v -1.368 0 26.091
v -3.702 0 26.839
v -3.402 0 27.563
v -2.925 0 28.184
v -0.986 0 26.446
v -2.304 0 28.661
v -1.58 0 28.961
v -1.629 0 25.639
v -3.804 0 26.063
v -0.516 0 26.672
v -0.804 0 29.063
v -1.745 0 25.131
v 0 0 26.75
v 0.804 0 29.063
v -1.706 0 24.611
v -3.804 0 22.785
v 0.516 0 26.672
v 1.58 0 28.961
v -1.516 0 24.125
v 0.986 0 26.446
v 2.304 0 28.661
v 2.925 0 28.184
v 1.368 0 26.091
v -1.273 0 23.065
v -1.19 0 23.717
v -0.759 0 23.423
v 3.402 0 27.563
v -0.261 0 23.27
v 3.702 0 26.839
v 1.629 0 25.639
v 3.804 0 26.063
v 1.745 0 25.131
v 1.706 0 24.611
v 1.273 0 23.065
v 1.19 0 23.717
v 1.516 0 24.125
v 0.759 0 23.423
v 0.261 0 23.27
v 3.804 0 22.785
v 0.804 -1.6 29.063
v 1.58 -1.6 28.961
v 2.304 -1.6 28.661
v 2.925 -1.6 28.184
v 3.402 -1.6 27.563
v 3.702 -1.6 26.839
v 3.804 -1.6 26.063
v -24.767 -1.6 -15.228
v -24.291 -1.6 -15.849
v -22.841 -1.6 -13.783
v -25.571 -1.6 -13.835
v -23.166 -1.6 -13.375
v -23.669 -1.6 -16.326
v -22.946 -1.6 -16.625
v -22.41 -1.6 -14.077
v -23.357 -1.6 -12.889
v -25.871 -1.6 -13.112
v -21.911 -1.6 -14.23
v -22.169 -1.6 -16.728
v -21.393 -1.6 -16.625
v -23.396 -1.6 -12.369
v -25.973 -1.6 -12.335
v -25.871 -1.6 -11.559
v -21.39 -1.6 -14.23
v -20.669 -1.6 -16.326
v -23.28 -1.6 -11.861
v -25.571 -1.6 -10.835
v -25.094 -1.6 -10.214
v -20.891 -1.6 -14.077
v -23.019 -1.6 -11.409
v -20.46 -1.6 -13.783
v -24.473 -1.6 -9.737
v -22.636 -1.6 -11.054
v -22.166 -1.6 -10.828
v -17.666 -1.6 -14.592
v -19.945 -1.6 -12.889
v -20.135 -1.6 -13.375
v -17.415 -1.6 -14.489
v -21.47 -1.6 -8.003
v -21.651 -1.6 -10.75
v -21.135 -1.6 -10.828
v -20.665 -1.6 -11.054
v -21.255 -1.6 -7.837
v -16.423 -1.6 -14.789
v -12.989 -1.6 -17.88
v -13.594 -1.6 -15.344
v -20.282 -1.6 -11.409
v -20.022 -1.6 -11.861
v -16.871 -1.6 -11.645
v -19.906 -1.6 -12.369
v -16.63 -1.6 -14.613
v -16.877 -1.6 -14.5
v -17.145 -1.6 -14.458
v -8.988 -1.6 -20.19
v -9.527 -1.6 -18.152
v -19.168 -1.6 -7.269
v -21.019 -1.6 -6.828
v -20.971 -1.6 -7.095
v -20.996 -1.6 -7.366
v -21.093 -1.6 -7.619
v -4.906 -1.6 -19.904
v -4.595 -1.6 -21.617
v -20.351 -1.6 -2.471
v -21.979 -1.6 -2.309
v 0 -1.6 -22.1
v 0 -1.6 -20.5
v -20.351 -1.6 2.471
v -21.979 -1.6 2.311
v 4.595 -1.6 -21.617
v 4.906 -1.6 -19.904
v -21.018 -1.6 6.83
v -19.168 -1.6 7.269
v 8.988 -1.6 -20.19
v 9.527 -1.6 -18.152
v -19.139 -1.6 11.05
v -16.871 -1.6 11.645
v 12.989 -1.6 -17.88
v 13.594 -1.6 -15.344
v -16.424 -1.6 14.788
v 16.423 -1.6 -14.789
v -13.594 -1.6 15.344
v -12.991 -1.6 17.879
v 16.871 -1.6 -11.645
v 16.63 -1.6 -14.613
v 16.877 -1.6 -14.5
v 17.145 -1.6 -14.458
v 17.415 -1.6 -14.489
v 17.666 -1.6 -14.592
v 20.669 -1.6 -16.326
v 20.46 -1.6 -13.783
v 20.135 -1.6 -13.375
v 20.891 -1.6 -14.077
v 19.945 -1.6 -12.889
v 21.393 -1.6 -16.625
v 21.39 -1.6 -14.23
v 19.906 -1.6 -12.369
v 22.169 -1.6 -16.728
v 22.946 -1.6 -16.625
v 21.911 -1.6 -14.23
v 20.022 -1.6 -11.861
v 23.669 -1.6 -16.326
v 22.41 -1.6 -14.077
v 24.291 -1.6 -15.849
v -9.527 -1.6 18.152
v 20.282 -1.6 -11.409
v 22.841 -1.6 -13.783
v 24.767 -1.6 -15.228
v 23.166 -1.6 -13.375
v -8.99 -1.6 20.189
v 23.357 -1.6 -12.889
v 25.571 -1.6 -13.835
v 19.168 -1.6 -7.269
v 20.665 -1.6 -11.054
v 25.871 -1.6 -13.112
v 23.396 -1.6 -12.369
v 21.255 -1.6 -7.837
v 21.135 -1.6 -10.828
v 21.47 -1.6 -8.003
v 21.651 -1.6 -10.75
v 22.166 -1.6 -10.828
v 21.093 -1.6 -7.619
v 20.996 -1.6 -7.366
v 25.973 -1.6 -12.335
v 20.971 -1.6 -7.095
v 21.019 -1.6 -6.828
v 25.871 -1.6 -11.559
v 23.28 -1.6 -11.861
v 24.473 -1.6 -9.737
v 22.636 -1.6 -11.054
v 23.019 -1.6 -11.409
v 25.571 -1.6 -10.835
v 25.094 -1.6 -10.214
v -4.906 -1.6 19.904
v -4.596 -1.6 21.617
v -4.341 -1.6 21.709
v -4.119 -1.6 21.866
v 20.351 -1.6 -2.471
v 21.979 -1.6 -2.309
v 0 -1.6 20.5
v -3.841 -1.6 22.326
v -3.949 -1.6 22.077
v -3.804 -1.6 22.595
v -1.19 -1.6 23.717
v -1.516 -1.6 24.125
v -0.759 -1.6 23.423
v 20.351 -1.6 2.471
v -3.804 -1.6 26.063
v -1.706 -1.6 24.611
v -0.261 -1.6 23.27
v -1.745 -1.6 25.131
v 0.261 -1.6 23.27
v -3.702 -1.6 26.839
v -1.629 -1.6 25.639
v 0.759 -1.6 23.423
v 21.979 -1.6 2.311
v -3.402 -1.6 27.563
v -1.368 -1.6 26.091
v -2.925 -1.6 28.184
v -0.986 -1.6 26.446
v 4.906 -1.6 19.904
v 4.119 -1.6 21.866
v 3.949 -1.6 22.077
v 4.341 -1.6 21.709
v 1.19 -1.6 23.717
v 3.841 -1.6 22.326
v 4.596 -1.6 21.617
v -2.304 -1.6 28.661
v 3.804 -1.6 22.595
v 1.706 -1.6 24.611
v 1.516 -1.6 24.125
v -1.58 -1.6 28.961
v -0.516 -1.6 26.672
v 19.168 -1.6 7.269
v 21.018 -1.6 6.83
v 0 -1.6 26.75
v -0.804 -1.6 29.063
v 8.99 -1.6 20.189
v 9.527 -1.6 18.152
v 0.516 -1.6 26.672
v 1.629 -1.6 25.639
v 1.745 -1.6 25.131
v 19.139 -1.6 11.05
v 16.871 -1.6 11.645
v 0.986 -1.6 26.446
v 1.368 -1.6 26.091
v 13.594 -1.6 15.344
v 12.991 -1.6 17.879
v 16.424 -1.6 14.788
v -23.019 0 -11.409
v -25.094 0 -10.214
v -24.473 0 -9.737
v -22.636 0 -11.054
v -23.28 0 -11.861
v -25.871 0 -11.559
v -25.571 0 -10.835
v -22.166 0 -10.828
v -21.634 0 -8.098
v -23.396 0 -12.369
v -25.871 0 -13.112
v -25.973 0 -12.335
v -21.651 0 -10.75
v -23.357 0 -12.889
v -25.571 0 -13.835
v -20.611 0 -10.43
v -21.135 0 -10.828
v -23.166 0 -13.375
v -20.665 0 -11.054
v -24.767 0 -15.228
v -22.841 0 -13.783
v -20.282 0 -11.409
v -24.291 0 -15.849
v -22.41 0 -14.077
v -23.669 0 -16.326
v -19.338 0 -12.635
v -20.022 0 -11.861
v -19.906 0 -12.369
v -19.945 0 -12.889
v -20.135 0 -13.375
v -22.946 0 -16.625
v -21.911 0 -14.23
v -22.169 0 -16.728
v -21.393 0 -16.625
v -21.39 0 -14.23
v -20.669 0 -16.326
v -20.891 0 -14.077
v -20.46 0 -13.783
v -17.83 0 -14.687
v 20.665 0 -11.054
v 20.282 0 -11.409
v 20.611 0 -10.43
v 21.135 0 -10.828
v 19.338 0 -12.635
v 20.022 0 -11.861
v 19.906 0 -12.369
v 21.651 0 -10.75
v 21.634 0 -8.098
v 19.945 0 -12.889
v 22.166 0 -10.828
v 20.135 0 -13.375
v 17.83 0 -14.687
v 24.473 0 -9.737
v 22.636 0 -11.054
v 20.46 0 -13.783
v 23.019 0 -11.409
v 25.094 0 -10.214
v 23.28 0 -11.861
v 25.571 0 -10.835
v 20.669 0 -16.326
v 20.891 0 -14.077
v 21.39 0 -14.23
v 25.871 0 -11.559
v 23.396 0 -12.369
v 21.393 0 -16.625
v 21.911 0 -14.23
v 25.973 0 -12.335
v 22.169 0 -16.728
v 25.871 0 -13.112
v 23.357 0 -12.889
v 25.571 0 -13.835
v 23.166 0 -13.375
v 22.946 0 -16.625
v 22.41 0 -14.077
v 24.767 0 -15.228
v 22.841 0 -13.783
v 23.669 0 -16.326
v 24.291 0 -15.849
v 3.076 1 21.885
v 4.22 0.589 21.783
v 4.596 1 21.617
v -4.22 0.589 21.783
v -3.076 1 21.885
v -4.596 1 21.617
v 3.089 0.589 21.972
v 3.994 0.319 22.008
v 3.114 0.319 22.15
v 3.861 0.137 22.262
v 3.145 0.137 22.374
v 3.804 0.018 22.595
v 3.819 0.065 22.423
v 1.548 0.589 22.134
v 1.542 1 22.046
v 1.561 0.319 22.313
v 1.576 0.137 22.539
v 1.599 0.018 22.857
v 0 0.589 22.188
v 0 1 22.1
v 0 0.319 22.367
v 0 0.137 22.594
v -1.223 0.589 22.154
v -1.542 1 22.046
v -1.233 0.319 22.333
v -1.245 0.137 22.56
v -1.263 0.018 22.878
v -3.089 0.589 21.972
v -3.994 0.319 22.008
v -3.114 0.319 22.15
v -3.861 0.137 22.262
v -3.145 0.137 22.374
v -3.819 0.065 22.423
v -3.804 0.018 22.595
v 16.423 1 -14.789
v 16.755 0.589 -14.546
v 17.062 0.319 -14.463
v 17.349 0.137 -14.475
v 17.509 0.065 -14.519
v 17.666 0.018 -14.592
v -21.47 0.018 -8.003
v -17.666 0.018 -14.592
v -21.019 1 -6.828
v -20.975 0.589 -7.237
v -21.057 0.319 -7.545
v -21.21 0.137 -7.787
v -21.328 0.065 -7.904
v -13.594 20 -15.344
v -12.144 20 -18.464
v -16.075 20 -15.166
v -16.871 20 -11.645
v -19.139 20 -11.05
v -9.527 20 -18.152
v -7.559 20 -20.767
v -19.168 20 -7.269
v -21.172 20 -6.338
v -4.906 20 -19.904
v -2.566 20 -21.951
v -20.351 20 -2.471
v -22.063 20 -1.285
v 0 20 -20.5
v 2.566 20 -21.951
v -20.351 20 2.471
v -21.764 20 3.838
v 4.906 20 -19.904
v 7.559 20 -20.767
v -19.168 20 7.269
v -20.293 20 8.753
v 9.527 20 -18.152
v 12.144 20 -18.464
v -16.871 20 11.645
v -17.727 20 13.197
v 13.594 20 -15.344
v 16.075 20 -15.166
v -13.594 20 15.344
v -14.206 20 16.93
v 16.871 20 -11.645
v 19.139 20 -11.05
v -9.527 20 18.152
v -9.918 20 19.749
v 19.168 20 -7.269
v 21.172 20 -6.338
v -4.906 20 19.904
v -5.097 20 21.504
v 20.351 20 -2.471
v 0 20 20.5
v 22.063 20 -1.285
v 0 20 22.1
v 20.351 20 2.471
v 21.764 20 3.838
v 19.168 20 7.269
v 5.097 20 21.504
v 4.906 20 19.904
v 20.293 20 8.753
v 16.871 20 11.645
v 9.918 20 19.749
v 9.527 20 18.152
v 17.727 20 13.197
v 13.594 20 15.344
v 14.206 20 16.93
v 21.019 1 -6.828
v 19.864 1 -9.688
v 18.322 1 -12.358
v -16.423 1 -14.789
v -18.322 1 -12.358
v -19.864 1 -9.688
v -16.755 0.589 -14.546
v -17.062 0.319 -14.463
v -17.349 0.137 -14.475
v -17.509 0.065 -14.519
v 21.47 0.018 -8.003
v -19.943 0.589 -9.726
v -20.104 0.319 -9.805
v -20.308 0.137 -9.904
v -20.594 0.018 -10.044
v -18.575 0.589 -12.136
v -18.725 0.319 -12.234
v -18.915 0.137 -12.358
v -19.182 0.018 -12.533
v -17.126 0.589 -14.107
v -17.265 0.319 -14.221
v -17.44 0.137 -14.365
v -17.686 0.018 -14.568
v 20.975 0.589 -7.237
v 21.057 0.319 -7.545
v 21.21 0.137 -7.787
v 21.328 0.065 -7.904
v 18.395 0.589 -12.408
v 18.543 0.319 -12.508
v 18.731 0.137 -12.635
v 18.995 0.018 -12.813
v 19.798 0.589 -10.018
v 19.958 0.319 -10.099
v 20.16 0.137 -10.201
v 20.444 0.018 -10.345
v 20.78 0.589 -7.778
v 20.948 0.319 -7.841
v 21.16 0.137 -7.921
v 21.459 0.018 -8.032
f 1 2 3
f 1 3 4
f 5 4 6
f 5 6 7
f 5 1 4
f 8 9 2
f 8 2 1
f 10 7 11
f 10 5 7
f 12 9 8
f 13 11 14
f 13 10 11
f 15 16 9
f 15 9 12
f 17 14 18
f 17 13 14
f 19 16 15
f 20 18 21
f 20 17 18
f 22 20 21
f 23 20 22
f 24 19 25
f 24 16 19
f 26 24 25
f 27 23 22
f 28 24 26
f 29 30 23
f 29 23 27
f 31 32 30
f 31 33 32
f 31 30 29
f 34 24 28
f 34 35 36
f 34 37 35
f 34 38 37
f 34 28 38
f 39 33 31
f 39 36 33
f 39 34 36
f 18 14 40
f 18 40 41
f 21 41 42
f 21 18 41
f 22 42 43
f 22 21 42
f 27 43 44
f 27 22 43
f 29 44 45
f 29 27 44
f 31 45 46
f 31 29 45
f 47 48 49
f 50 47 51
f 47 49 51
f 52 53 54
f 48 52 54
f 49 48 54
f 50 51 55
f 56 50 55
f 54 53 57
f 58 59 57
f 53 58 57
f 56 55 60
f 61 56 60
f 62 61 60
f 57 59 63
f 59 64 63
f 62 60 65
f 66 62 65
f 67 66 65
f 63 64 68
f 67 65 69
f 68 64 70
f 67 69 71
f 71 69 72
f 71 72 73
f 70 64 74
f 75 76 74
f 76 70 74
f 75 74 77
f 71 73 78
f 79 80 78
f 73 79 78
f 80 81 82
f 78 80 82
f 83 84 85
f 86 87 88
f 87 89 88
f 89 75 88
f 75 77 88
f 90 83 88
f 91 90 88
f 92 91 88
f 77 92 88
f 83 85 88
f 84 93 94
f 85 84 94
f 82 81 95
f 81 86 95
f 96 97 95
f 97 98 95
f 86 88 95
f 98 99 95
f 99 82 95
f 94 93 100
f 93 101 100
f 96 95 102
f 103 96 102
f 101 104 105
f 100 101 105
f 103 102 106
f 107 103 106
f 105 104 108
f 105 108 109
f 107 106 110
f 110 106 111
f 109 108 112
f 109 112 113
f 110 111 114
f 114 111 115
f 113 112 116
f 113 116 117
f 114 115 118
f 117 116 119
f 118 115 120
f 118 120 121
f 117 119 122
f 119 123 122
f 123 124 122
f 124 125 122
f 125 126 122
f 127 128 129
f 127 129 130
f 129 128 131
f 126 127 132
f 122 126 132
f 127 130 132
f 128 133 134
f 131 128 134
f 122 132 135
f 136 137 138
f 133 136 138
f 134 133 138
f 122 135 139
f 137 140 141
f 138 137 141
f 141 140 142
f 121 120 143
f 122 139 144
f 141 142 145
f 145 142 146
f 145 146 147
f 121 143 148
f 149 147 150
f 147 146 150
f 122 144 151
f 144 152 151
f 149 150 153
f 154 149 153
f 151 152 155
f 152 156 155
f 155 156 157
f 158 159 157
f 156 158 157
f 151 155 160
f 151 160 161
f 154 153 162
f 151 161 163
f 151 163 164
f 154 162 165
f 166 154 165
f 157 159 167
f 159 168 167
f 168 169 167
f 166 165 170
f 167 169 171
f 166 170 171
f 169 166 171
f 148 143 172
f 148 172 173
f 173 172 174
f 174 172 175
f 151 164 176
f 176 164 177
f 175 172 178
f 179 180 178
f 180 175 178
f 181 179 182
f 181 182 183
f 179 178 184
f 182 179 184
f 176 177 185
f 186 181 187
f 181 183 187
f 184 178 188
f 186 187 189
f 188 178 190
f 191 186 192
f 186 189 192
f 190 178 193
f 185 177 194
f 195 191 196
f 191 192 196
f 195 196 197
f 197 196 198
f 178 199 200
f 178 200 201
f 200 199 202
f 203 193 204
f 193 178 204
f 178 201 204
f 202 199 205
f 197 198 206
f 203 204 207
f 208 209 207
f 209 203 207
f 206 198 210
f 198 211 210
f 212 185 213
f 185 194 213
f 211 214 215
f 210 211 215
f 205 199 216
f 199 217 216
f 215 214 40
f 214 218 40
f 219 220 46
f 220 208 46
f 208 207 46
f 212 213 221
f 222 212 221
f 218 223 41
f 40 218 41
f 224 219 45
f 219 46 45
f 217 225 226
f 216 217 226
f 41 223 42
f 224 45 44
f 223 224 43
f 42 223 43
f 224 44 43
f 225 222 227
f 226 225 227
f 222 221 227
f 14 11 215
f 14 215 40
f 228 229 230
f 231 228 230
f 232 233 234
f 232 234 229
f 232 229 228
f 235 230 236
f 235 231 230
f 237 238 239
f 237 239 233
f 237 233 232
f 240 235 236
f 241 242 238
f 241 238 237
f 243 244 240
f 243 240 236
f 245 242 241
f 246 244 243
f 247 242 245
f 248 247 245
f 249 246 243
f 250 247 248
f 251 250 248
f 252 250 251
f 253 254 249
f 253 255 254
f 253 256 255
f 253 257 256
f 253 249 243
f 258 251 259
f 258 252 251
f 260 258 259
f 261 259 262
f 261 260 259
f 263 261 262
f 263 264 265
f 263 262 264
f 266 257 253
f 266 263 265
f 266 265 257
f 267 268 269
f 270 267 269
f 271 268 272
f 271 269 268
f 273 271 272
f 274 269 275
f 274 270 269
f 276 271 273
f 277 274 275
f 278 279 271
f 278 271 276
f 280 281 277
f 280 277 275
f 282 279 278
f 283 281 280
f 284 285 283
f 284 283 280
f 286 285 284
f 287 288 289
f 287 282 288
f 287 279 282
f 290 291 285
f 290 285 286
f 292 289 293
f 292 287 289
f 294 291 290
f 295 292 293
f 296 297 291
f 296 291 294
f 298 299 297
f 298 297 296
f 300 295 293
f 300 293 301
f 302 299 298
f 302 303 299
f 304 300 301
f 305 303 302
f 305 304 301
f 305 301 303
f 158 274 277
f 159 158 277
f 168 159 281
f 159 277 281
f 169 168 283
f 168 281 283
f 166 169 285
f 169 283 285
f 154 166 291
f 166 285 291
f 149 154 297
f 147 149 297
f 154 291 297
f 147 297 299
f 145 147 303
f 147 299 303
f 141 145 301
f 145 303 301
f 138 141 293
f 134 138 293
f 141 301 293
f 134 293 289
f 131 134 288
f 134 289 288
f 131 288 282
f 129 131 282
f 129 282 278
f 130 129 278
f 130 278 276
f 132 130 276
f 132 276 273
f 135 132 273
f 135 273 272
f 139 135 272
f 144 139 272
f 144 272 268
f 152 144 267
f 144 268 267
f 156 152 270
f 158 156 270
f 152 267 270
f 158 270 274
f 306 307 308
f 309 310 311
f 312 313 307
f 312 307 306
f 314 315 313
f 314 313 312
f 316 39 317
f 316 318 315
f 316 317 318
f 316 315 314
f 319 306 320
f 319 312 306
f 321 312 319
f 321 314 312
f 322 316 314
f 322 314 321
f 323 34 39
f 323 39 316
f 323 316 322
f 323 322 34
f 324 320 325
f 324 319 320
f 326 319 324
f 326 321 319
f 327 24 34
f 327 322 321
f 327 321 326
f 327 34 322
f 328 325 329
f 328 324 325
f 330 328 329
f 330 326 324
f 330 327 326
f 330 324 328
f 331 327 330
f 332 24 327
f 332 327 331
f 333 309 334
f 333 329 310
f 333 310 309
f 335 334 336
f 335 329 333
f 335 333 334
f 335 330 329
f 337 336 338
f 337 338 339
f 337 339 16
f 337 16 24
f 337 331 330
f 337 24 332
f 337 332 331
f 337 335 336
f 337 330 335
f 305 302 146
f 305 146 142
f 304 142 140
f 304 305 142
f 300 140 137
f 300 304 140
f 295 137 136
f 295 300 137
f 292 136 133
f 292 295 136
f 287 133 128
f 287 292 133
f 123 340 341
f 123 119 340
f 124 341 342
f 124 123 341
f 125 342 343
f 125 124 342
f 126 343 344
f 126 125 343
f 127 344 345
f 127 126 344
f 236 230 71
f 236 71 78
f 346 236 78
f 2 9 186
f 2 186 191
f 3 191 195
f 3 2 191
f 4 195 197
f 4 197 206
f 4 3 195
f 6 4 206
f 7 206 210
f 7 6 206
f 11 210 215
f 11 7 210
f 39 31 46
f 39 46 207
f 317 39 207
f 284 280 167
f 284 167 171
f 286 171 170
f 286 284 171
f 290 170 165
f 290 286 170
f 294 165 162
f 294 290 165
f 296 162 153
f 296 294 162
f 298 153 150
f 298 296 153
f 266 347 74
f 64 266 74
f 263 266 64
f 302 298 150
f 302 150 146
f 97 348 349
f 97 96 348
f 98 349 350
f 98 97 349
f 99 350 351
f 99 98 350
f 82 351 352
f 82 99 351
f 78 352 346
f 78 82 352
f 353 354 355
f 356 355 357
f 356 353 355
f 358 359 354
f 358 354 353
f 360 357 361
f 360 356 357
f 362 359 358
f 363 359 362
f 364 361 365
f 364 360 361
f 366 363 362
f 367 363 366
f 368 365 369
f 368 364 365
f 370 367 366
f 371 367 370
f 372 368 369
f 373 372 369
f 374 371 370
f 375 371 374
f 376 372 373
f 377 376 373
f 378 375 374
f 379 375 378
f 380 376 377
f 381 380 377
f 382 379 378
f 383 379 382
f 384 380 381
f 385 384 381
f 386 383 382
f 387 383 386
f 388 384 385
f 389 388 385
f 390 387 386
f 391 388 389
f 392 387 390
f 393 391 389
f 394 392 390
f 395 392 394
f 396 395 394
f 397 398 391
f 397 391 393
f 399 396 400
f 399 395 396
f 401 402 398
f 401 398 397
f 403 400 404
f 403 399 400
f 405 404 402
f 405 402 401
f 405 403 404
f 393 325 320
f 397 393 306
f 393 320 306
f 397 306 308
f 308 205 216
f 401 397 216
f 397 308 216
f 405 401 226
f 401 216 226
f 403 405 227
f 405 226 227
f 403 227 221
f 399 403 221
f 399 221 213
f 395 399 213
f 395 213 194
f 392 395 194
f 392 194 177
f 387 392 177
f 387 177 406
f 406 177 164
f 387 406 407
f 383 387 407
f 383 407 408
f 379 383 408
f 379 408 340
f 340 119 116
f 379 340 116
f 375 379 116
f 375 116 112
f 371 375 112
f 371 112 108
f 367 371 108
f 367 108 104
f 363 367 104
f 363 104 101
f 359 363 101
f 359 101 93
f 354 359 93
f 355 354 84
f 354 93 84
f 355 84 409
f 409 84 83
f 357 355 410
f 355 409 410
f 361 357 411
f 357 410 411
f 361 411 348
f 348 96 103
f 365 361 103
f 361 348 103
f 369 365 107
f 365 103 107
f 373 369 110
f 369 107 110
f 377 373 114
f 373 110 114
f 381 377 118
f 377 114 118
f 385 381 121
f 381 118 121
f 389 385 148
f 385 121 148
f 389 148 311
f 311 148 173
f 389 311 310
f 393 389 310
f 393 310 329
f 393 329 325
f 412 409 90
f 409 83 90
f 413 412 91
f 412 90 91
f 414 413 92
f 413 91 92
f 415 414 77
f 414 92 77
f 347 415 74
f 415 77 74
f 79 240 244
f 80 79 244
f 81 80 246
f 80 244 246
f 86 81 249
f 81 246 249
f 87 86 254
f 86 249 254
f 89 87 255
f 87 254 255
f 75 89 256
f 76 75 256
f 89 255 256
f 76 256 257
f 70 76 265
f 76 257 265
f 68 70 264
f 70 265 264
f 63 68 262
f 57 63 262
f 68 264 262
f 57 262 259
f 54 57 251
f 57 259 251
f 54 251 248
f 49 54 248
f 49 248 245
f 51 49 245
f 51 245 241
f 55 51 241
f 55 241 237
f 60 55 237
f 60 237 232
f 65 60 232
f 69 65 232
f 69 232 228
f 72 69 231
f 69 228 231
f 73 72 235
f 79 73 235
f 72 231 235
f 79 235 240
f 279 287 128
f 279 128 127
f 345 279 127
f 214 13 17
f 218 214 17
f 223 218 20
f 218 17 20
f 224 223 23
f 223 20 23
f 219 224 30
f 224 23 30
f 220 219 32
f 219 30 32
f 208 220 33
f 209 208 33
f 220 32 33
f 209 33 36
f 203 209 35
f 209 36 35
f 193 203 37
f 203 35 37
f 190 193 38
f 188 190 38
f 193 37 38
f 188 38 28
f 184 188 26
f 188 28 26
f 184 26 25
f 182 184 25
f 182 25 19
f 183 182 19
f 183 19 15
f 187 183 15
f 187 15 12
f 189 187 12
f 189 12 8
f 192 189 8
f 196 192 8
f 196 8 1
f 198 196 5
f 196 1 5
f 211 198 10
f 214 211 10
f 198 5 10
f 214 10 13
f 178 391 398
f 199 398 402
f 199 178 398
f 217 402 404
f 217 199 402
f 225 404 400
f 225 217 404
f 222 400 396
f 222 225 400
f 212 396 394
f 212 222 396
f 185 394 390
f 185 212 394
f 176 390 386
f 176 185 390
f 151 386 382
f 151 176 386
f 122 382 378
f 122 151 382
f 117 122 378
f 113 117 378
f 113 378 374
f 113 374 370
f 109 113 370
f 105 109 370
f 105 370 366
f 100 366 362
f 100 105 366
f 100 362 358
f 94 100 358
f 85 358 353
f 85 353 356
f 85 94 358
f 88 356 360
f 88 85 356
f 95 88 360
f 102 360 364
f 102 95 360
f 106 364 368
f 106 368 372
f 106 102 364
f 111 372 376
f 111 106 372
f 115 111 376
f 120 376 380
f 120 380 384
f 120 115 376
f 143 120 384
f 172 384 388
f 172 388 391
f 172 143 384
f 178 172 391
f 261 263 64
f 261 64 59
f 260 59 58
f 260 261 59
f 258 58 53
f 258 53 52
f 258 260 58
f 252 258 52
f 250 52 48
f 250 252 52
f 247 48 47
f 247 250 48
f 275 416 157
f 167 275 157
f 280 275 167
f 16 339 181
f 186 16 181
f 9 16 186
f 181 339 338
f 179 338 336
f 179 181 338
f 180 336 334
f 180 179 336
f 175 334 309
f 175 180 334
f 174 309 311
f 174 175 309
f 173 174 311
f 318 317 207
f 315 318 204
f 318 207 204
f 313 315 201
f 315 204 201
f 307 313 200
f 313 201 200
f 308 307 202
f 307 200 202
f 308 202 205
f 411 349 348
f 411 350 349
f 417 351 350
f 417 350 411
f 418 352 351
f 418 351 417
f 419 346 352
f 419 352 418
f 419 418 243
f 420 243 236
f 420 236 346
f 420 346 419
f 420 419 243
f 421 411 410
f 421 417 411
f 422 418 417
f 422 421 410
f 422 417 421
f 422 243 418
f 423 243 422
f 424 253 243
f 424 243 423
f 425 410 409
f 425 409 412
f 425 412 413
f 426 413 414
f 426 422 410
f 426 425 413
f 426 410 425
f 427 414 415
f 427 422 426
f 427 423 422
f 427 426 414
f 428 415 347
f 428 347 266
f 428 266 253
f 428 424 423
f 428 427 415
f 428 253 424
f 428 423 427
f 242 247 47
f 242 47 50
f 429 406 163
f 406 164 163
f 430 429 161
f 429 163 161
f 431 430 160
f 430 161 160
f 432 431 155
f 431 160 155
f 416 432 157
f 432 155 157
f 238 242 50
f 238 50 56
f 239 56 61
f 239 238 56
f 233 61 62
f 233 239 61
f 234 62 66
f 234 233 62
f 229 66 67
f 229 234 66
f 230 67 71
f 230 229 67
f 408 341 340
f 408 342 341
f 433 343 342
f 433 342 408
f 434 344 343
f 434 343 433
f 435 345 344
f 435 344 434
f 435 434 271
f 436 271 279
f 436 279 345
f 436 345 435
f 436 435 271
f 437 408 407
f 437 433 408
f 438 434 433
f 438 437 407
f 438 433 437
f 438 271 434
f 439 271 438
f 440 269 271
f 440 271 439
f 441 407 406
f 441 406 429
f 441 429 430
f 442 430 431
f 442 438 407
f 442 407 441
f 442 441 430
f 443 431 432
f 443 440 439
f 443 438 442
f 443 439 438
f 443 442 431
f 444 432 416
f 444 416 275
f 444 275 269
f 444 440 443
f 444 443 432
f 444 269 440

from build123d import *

# Parameters (mm, degrees)
SKETCH1_R           = 20.5
BOSS_EXTRUDE2_DEPTH = 20
SHELL1_T            = 1.6
CUT_EXTRUDE1_START  = -10
SKETCH7_R           = 20.5
CUT_EXTRUDE1_DEPTH  = 10
SKETCH8_R           = 1.75
BOSS_EXTRUDE3_DEPTH = 1.6
FILLET1_R           = 1


with BuildPart() as part:
    # Sketch1 → Boss-Extrude2 (new body)
    with BuildSketch(Plane(origin=(0, 0, 0), x_dir=(1, 0, 0), z_dir=(0, 1, 0))):
        with Locations(Location((0, 0, 0), (0, 0, 270))):
            Circle(SKETCH1_R)
    extrude(amount=BOSS_EXTRUDE2_DEPTH)

    # Shell1
    shell1_openings = [part.faces().sort_by_distance(p)[0] for p in [
        (0, 20, 0),
    ]]
    offset(amount=SHELL1_T, openings=shell1_openings, kind=Kind.INTERSECTION)

    # Sketch7 → Cut-Extrude1 (cut)
    with BuildSketch(Plane(origin=(0, 0, 0), x_dir=(1, 0, 0), z_dir=(0, 1, 0)).offset(CUT_EXTRUDE1_START)):
        with Locations(Location((0, 0, 0), (0, 0, 270))):
            Circle(SKETCH7_R)
    extrude(amount=CUT_EXTRUDE1_DEPTH, mode=Mode.SUBTRACT)

    # Sketch8 → Boss-Extrude3 (add)
    # profile 1 of 3: a face of its own
    with BuildSketch(Plane(origin=(0, 0, 0), x_dir=(1, 0, 0), z_dir=(0, 1, 0))):
        with BuildLine():
            Line((-3.803893319, -20.862908404), (-3.803893319, -26.062908404))
            ThreePointArc((-3.803893319, -26.062908404), (-2.925213663, -28.184228747), (-0.803893319, -29.062908404))
            Line((-0.803893319, -29.062908404), (0.803893319, -29.062908404))
            ThreePointArc((0.803893319, -29.062908404), (2.925213663, -28.184228747), (3.803893319, -26.062908404))
            Line((3.803893319, -26.062908404), (3.803893319, -20.862908404))
            ThreePointArc((3.803893319, -20.862908404), (0, -21.291513217), (-3.803893319, -20.862908404))
        make_face()
        with Locations(Location((0, -25, 0), (0, 0, 270))):
            Circle(SKETCH8_R, mode=Mode.SUBTRACT)
    # profile 2 of 3: a face of its own
    with BuildSketch(Plane(origin=(0, 0, 0), x_dir=(1, 0, 0), z_dir=(0, 1, 0))):
        with BuildLine():
            Line((-16.165862015, 13.725722449), (-20.669194115, 16.325722449))
            ThreePointArc((-20.669194115, 16.325722449), (-22.94565125, 16.625423717), (-24.767270326, 15.227646238))
            Line((-24.767270326, 15.227646238), (-25.571163645, 13.835262166))
            ThreePointArc((-25.571163645, 13.835262166), (-25.870864913, 11.55880503), (-24.473087434, 9.737185954))
            Line((-24.473087434, 9.737185954), (-19.969755334, 7.137185954))
            ThreePointArc((-19.969755334, 7.137185954), (-18.438991331, 10.645756608), (-16.165862015, 13.725722449))
        make_face()
        with Locations(Location((-21.650635095, 12.5, 0), (0, 0, 270))):
            Circle(SKETCH8_R, mode=Mode.SUBTRACT)
    # profile 3 of 3: a face of its own
    with BuildSketch(Plane(origin=(0, 0, 0), x_dir=(1, 0, 0), z_dir=(0, 1, 0))):
        with BuildLine():
            Line((19.969755334, 7.137185954), (24.473087434, 9.737185954))
            ThreePointArc((24.473087434, 9.737185954), (25.870864913, 11.55880503), (25.571163645, 13.835262166))
            Line((25.571163645, 13.835262166), (24.767270326, 15.227646238))
            ThreePointArc((24.767270326, 15.227646238), (22.94565125, 16.625423717), (20.669194115, 16.325722449))
            Line((20.669194115, 16.325722449), (16.165862015, 13.725722449))
            ThreePointArc((16.165862015, 13.725722449), (18.438991331, 10.645756608), (19.969755334, 7.137185954))
        make_face()
        with Locations(Location((21.650635095, 12.5, 0), (0, 0, 270))):
            Circle(SKETCH8_R, mode=Mode.SUBTRACT)
    extrude(amount=-BOSS_EXTRUDE3_DEPTH)

    # Fillet1
    fillet1_edges = [part.edges().sort_by_distance(p)[0] for p in [
        (1.909082947, 0, 22.017388635),
        (-3.803893319, -0.8, 21.770172154),
        (3.803893319, -0.8, 21.770172154),
        (-19.139161424, 0, -11.05),
        (-16.951575471, -0.8, -14.179354325),
        (-20.75546879, -0.8, -7.590817829),
        (19.139161424, 0, -11.05),
        (20.75546879, -0.8, -7.590817829),
        (16.951575471, -0.8, -14.179354325),
    ]]
    fillet(fillet1_edges, radius=FILLET1_R)


solid = part.part
